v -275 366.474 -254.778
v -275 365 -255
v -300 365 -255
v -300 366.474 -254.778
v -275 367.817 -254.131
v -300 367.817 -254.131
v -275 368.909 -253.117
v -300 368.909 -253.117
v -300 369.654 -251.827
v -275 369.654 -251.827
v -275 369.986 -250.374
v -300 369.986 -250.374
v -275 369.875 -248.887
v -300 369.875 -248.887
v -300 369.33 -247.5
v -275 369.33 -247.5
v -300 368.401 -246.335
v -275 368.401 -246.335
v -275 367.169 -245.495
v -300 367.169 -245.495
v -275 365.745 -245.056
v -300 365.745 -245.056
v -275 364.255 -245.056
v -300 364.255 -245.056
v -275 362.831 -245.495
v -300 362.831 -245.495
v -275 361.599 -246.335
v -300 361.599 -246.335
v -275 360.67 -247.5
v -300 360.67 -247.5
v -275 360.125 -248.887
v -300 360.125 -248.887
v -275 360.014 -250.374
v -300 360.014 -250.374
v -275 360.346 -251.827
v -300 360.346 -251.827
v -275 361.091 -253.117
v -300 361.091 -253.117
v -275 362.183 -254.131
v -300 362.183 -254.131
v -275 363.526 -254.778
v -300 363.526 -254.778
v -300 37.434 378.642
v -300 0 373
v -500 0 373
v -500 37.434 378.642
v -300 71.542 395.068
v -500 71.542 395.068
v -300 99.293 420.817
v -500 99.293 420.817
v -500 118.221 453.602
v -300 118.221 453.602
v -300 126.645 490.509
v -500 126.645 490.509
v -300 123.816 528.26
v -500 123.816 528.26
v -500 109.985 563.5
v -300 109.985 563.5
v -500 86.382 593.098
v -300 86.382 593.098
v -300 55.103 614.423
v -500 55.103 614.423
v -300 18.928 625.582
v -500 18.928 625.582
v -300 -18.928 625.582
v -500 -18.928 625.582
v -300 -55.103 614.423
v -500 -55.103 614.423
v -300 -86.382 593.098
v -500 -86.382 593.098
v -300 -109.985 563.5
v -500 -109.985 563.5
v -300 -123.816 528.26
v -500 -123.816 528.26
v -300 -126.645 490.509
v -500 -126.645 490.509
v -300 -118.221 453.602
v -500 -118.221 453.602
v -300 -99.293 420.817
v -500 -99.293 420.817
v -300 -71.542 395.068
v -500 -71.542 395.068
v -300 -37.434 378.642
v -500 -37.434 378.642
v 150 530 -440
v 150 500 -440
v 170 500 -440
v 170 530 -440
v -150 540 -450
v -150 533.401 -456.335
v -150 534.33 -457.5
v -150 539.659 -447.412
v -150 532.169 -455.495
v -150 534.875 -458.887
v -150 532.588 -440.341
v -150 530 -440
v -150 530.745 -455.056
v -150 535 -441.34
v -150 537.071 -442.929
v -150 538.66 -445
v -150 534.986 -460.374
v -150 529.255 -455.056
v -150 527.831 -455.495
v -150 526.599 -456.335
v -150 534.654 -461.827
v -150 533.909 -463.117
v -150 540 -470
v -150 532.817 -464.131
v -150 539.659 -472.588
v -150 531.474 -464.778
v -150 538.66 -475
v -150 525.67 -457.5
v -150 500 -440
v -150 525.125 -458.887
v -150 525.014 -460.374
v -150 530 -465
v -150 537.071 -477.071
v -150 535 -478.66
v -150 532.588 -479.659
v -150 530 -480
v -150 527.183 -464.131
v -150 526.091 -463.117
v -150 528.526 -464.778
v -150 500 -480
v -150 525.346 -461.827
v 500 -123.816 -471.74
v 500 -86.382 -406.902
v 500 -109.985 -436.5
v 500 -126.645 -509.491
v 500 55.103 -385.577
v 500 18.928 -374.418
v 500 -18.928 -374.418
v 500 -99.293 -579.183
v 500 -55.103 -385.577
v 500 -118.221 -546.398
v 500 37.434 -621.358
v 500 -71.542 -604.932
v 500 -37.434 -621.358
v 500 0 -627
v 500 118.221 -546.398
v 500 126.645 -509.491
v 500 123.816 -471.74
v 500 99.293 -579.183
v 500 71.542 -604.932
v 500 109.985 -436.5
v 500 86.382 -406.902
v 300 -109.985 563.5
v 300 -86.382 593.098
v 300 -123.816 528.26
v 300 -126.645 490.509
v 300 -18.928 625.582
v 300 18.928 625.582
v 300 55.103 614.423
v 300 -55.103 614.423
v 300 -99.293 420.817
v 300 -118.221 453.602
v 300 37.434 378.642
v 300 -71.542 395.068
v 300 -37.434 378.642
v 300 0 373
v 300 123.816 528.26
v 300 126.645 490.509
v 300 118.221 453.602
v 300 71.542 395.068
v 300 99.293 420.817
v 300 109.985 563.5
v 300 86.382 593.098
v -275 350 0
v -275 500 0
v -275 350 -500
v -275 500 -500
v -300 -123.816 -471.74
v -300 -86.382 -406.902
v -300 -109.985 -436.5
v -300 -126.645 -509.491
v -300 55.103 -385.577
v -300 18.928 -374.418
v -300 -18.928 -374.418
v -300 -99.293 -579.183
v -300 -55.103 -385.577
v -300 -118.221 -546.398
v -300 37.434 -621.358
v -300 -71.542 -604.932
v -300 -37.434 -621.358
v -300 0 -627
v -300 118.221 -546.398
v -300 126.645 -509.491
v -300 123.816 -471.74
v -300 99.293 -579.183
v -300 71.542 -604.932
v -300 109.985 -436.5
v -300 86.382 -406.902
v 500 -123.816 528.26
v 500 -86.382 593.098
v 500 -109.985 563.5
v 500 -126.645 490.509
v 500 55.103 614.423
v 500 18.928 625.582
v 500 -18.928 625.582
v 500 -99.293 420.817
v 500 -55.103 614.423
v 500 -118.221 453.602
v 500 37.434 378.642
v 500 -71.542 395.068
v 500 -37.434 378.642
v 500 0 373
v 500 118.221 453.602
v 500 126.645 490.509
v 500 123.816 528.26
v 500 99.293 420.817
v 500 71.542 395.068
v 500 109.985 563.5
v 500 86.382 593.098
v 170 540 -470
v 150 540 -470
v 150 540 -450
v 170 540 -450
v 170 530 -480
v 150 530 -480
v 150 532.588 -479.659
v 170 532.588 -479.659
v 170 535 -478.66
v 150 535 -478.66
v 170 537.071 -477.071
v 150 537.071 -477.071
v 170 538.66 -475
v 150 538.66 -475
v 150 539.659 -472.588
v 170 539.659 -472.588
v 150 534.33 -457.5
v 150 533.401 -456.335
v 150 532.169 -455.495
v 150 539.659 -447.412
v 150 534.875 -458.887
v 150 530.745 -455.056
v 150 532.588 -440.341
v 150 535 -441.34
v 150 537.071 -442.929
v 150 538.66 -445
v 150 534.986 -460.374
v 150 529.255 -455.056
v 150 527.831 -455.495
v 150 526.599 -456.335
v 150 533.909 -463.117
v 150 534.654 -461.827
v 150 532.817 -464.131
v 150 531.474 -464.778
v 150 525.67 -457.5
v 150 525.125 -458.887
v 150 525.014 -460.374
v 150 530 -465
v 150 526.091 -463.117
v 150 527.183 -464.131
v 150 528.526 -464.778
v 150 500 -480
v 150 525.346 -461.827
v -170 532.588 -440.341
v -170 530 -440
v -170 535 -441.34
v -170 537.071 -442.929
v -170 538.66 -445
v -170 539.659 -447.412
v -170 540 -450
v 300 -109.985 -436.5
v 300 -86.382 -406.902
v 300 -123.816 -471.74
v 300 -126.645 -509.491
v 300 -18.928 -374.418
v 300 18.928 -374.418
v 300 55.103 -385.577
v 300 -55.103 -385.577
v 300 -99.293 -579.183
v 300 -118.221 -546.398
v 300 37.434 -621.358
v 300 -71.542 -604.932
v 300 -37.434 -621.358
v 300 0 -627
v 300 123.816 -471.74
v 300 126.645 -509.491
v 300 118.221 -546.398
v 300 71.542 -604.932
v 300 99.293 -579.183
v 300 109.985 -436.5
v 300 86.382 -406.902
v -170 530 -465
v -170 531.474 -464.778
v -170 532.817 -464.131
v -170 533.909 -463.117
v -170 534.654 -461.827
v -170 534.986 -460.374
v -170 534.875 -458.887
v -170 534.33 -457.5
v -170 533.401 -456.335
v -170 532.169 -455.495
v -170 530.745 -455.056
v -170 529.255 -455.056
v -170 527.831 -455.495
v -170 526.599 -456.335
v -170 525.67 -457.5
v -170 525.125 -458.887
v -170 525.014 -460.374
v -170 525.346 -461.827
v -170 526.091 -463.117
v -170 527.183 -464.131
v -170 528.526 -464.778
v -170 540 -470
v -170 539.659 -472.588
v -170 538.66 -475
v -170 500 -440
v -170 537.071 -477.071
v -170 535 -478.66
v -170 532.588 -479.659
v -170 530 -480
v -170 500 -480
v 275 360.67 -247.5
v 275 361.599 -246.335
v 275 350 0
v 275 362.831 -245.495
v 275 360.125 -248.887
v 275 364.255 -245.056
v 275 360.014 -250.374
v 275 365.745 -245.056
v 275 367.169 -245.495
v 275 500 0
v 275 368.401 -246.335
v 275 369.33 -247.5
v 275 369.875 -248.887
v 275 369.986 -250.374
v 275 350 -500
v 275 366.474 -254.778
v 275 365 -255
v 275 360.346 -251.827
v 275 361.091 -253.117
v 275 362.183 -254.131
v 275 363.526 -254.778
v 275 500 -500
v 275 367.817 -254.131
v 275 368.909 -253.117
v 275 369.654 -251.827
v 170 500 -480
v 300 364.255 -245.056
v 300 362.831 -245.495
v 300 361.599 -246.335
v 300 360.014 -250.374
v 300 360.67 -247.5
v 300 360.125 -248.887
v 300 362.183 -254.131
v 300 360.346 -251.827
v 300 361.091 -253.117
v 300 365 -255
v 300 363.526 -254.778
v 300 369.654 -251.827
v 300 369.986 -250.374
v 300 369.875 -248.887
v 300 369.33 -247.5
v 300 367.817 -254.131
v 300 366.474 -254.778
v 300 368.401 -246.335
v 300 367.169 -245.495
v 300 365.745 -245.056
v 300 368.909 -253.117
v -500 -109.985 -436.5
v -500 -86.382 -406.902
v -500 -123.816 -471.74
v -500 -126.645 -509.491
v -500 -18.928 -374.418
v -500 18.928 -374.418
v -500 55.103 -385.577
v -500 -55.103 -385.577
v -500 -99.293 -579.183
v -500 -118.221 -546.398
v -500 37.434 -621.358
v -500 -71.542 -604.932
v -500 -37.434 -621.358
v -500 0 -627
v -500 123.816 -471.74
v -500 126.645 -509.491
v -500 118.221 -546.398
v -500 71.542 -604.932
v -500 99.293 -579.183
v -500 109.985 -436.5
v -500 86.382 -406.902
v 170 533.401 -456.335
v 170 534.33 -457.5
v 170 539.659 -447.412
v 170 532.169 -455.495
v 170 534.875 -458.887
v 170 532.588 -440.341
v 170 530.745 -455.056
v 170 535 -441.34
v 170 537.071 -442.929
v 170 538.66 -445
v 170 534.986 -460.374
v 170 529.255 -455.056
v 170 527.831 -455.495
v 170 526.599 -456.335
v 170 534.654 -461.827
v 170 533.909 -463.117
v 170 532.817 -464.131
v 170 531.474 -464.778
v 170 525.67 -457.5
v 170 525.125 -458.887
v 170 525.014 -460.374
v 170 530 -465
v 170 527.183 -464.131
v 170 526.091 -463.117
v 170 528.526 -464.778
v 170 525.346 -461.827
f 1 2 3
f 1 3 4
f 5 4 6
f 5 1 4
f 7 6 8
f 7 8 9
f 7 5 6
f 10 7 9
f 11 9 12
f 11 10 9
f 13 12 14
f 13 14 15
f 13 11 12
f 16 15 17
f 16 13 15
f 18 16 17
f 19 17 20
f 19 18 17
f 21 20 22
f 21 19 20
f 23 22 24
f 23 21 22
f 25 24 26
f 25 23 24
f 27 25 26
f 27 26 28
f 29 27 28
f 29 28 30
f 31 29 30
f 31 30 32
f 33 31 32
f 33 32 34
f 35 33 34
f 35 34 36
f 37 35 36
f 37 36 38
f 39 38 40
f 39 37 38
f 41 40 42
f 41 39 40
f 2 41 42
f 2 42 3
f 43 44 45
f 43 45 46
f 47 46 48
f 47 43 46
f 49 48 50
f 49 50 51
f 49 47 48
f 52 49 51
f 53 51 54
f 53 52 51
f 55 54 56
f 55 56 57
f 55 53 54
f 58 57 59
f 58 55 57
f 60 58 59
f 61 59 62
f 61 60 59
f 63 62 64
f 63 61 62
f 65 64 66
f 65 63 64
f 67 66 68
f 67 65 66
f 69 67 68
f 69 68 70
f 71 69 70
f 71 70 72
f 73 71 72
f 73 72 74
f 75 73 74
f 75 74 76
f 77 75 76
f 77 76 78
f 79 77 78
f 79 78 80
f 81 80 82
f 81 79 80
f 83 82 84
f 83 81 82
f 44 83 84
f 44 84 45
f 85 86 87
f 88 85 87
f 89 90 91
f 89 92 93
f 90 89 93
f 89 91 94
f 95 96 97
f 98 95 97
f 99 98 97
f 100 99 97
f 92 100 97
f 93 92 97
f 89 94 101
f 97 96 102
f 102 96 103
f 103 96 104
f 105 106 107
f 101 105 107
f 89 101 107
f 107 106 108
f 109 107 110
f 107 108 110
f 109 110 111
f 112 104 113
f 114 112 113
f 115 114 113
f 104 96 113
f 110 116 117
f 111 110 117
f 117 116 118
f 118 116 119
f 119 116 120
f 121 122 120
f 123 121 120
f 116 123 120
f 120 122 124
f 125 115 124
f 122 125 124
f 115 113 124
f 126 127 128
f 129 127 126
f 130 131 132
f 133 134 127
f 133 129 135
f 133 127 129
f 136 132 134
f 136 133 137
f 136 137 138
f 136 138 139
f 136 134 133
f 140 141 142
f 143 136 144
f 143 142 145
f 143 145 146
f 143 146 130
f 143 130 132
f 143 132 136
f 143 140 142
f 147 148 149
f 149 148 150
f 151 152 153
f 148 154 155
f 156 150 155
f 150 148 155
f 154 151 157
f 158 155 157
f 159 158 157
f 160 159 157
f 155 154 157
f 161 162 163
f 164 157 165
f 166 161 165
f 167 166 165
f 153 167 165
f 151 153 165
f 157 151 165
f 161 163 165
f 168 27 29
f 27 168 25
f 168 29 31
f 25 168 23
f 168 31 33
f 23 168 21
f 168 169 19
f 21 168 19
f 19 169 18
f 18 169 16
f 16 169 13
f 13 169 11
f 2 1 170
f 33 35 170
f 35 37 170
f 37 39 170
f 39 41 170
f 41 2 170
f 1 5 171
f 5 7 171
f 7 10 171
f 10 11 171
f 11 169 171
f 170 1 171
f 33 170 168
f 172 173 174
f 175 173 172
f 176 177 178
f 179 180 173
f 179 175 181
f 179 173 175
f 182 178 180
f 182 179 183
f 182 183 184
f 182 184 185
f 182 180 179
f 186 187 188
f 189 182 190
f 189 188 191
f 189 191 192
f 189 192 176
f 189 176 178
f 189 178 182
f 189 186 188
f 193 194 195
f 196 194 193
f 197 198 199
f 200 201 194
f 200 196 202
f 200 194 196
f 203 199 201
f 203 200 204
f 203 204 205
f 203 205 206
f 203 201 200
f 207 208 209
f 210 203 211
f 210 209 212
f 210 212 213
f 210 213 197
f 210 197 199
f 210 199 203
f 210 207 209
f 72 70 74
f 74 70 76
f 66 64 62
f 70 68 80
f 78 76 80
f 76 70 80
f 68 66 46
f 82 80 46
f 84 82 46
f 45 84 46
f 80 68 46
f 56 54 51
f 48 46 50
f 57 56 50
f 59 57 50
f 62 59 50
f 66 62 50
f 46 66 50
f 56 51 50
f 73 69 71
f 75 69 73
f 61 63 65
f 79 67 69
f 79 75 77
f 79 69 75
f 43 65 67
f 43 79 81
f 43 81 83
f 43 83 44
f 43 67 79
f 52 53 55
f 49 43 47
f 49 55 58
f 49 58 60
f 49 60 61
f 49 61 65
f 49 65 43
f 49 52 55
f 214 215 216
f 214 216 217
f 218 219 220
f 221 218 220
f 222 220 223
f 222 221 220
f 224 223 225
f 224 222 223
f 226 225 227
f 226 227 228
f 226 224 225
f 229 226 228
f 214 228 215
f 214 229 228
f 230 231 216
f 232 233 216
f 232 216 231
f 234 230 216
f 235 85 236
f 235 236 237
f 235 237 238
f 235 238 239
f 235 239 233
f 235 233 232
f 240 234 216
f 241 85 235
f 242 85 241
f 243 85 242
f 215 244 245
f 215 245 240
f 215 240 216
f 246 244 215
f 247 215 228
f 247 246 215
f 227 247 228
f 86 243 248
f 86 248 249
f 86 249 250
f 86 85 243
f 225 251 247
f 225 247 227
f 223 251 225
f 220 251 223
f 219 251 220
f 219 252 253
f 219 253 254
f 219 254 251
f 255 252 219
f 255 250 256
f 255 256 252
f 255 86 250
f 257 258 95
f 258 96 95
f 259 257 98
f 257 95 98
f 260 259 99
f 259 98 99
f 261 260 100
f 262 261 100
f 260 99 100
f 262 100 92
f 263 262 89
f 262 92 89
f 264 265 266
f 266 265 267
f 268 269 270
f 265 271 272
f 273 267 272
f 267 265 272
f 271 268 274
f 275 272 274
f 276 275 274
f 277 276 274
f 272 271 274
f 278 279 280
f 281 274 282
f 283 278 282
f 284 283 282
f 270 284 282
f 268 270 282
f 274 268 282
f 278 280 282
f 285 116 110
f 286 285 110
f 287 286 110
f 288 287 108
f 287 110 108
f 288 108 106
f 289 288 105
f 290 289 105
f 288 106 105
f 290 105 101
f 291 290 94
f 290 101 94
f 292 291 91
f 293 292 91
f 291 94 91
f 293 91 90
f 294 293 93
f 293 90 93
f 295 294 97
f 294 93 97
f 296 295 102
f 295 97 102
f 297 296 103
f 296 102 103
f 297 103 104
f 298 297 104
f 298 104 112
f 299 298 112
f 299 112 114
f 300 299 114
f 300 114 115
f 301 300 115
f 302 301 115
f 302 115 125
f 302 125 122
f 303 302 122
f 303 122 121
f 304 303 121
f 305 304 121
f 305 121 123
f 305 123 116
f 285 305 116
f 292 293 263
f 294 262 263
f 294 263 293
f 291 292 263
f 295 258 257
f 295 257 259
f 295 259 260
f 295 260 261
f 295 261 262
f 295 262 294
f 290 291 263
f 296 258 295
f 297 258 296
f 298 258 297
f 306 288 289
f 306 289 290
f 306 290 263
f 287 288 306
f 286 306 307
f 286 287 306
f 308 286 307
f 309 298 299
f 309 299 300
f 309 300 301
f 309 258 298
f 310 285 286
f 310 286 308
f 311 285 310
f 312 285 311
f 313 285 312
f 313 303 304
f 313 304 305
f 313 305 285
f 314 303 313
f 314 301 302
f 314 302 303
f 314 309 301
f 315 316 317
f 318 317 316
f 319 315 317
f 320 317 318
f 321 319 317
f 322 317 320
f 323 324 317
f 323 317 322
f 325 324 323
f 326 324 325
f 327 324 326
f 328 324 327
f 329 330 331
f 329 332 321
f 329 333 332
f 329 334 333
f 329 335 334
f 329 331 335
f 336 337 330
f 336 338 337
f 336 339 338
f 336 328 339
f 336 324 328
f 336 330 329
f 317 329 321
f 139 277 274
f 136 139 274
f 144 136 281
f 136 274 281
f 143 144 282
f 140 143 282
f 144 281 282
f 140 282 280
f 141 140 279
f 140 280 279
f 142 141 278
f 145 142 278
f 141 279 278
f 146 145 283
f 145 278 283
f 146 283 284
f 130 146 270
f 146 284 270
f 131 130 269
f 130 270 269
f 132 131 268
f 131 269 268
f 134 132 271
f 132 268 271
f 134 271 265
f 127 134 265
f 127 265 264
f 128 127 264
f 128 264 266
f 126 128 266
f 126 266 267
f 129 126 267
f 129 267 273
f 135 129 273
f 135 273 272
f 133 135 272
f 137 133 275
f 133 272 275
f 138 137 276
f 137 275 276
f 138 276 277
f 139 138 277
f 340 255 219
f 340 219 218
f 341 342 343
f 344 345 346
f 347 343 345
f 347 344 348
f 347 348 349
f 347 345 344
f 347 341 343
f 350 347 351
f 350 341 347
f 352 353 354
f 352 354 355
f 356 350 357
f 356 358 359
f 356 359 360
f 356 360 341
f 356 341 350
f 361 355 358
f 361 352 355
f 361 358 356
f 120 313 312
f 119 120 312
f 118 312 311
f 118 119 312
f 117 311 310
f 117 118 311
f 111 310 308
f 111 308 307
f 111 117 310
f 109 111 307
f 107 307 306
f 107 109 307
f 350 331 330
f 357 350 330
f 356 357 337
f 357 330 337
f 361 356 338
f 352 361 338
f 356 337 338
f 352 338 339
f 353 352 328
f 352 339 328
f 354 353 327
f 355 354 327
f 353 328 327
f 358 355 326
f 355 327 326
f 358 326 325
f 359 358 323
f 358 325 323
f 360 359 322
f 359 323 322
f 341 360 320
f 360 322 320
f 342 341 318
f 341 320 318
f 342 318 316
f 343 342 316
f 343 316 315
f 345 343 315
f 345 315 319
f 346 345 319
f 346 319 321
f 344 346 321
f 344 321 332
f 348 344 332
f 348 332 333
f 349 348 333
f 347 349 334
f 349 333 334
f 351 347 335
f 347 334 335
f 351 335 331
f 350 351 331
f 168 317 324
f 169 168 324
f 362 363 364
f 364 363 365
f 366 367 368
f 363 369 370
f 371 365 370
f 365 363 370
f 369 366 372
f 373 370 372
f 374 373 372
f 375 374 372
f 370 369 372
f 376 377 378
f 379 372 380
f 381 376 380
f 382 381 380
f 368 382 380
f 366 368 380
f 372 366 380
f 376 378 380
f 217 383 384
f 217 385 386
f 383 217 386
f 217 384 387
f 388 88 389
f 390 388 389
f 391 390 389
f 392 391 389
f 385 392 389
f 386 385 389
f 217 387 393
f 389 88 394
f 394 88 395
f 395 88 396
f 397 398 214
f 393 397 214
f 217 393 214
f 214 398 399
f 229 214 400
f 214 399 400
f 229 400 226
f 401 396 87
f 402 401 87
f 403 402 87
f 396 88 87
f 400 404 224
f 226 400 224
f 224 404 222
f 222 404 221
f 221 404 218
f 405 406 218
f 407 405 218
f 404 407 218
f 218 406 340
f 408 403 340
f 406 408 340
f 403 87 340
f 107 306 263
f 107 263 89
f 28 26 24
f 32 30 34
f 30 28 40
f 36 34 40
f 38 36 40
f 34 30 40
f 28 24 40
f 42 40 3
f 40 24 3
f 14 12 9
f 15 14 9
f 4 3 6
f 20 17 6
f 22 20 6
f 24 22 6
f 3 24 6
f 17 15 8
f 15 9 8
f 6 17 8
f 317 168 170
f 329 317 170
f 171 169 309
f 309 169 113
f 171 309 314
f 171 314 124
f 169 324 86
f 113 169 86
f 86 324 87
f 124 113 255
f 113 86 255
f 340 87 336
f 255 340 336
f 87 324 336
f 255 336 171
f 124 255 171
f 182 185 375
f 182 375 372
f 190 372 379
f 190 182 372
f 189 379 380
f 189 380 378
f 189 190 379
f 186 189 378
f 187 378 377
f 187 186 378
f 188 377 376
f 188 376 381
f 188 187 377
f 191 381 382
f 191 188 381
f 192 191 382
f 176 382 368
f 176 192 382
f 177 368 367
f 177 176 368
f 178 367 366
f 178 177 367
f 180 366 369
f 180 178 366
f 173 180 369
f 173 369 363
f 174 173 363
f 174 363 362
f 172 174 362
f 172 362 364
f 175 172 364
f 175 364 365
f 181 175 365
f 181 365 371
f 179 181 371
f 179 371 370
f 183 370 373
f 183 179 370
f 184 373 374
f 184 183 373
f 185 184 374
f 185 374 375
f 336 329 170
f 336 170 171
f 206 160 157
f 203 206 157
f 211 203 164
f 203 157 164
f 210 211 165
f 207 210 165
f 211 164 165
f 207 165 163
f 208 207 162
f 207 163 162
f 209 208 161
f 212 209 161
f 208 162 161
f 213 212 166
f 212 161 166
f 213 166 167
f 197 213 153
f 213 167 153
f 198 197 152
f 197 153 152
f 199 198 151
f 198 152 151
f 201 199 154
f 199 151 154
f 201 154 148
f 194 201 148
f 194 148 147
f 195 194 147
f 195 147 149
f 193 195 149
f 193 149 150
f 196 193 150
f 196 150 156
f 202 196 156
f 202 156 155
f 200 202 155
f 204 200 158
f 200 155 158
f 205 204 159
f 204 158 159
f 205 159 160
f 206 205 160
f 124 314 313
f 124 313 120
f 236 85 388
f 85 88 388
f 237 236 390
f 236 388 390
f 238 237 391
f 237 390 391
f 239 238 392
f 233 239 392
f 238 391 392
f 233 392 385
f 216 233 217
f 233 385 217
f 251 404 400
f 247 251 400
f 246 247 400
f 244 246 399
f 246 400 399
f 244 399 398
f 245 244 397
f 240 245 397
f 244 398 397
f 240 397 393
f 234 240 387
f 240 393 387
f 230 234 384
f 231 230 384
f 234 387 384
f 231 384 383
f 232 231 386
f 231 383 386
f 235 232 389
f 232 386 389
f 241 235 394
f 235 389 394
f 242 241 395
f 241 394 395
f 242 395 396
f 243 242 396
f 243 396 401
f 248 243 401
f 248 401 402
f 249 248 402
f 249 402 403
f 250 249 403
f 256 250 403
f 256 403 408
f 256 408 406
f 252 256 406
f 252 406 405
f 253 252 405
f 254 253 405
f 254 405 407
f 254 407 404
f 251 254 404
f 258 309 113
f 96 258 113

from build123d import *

# Parameters (mm, degrees)
SKETCH2_R             = 127
BOSS_EXTRUDE1_DEPTH   = 200
BOSS_EXTRUDE1_2_DEPTH = 200
SKETCH3_W             = 500
SKETCH3_H             = 150
BOSS_EXTRUDE2_DEPTH   = 275
SKETCH4_R             = 5
BOSS_EXTRUDE3_DEPTH   = 25
SKETCH6_W             = 20
SKETCH6_H             = 40
BOSS_EXTRUDE4_DEPTH   = 40
FILLET1_R             = 10
SKETCH7_R             = 5
CUT_EXTRUDE1_DEPTH    = 671


with BuildPart() as part:
    # Sketch2 → Boss-Extrude1 (new body)
    with BuildSketch(Plane(origin=(300, 0, 0), x_dir=(0, 0, -1), z_dir=(1, 0, 0))):
        with Locations((-500, 0)):
            Circle(SKETCH2_R)
    extrude(amount=BOSS_EXTRUDE1_DEPTH)


with BuildPart() as body_2:
    # Sketch2 → Boss-Extrude1 2 (new body)
    with BuildSketch(Plane(origin=(300, 0, 0), x_dir=(0, 0, -1), z_dir=(1, 0, 0))):
        with Locations((500, 0)):
            Circle(SKETCH2_R)
    extrude(amount=BOSS_EXTRUDE1_2_DEPTH)


with BuildPart() as body_3:
    # Mirror4: mirrored copy
    add(part.part.mirror(Plane(origin=(0, 0, 0), x_dir=(0, 0, 1), z_dir=(1, 0, 0))))


with BuildPart() as body_4:
    # Mirror4 2: mirrored copy
    add(body_2.part.mirror(Plane(origin=(0, 0, 0), x_dir=(0, 0, 1), z_dir=(1, 0, 0))))


with BuildPart() as body_5:
    # Sketch3 → Boss-Extrude2 (new body, symmetric)
    with BuildSketch(Plane(origin=(0, 0, 0), x_dir=(0, 0, -1), z_dir=(1, 0, 0))):
        with Locations((250, 425)):
            Rectangle(SKETCH3_W, SKETCH3_H)
    extrude(amount=BOSS_EXTRUDE2_DEPTH, both=True)

    # Sketch4 → Boss-Extrude3 (add)
    with BuildSketch(Plane(origin=(275, 0, 0), x_dir=(0, 0, -1), z_dir=(1, 0, 0))):
        with Locations((250, 365)):
            Circle(SKETCH4_R)
    boss_extrude3 = extrude(amount=BOSS_EXTRUDE3_DEPTH)

    # Mirror6: Boss-Extrude3 across plane
    add(boss_extrude3.mirror(Plane(origin=(0, 0, 0), x_dir=(0, 0, 1), z_dir=(1, 0, 0))))

    # Sketch6 → Boss-Extrude4 (add)
    with BuildSketch(Plane(origin=(0, 500, 0), x_dir=(1, 0, 0), z_dir=(0, 1, 0))):
        with Locations((-160, 460)):
            Rectangle(SKETCH6_W, SKETCH6_H)
        with Locations((160, 460)):
            Rectangle(SKETCH6_W, SKETCH6_H)
    extrude(amount=BOSS_EXTRUDE4_DEPTH)

    # Fillet1
    fillet1_edges = [body_5.edges().sort_by_distance(p)[0] for p in [
        (-160, 540, -440),
        (-160, 540, -480),
        (160, 540, -440),
        (160, 540, -480),
    ]]
    fillet(fillet1_edges, radius=FILLET1_R)

    # Sketch7 → Cut-Extrude1 (cut, through all)
    with BuildSketch(Plane(origin=(170, 0, 0), x_dir=(0, 0, -1), z_dir=(1, 0, 0))):
        with Locations((460, 530)):
            Circle(SKETCH7_R)
    extrude(amount=-CUT_EXTRUDE1_DEPTH, mode=Mode.SUBTRACT)


solid = Compound([part.part, body_2.part, body_3.part, body_4.part, body_5.part])
